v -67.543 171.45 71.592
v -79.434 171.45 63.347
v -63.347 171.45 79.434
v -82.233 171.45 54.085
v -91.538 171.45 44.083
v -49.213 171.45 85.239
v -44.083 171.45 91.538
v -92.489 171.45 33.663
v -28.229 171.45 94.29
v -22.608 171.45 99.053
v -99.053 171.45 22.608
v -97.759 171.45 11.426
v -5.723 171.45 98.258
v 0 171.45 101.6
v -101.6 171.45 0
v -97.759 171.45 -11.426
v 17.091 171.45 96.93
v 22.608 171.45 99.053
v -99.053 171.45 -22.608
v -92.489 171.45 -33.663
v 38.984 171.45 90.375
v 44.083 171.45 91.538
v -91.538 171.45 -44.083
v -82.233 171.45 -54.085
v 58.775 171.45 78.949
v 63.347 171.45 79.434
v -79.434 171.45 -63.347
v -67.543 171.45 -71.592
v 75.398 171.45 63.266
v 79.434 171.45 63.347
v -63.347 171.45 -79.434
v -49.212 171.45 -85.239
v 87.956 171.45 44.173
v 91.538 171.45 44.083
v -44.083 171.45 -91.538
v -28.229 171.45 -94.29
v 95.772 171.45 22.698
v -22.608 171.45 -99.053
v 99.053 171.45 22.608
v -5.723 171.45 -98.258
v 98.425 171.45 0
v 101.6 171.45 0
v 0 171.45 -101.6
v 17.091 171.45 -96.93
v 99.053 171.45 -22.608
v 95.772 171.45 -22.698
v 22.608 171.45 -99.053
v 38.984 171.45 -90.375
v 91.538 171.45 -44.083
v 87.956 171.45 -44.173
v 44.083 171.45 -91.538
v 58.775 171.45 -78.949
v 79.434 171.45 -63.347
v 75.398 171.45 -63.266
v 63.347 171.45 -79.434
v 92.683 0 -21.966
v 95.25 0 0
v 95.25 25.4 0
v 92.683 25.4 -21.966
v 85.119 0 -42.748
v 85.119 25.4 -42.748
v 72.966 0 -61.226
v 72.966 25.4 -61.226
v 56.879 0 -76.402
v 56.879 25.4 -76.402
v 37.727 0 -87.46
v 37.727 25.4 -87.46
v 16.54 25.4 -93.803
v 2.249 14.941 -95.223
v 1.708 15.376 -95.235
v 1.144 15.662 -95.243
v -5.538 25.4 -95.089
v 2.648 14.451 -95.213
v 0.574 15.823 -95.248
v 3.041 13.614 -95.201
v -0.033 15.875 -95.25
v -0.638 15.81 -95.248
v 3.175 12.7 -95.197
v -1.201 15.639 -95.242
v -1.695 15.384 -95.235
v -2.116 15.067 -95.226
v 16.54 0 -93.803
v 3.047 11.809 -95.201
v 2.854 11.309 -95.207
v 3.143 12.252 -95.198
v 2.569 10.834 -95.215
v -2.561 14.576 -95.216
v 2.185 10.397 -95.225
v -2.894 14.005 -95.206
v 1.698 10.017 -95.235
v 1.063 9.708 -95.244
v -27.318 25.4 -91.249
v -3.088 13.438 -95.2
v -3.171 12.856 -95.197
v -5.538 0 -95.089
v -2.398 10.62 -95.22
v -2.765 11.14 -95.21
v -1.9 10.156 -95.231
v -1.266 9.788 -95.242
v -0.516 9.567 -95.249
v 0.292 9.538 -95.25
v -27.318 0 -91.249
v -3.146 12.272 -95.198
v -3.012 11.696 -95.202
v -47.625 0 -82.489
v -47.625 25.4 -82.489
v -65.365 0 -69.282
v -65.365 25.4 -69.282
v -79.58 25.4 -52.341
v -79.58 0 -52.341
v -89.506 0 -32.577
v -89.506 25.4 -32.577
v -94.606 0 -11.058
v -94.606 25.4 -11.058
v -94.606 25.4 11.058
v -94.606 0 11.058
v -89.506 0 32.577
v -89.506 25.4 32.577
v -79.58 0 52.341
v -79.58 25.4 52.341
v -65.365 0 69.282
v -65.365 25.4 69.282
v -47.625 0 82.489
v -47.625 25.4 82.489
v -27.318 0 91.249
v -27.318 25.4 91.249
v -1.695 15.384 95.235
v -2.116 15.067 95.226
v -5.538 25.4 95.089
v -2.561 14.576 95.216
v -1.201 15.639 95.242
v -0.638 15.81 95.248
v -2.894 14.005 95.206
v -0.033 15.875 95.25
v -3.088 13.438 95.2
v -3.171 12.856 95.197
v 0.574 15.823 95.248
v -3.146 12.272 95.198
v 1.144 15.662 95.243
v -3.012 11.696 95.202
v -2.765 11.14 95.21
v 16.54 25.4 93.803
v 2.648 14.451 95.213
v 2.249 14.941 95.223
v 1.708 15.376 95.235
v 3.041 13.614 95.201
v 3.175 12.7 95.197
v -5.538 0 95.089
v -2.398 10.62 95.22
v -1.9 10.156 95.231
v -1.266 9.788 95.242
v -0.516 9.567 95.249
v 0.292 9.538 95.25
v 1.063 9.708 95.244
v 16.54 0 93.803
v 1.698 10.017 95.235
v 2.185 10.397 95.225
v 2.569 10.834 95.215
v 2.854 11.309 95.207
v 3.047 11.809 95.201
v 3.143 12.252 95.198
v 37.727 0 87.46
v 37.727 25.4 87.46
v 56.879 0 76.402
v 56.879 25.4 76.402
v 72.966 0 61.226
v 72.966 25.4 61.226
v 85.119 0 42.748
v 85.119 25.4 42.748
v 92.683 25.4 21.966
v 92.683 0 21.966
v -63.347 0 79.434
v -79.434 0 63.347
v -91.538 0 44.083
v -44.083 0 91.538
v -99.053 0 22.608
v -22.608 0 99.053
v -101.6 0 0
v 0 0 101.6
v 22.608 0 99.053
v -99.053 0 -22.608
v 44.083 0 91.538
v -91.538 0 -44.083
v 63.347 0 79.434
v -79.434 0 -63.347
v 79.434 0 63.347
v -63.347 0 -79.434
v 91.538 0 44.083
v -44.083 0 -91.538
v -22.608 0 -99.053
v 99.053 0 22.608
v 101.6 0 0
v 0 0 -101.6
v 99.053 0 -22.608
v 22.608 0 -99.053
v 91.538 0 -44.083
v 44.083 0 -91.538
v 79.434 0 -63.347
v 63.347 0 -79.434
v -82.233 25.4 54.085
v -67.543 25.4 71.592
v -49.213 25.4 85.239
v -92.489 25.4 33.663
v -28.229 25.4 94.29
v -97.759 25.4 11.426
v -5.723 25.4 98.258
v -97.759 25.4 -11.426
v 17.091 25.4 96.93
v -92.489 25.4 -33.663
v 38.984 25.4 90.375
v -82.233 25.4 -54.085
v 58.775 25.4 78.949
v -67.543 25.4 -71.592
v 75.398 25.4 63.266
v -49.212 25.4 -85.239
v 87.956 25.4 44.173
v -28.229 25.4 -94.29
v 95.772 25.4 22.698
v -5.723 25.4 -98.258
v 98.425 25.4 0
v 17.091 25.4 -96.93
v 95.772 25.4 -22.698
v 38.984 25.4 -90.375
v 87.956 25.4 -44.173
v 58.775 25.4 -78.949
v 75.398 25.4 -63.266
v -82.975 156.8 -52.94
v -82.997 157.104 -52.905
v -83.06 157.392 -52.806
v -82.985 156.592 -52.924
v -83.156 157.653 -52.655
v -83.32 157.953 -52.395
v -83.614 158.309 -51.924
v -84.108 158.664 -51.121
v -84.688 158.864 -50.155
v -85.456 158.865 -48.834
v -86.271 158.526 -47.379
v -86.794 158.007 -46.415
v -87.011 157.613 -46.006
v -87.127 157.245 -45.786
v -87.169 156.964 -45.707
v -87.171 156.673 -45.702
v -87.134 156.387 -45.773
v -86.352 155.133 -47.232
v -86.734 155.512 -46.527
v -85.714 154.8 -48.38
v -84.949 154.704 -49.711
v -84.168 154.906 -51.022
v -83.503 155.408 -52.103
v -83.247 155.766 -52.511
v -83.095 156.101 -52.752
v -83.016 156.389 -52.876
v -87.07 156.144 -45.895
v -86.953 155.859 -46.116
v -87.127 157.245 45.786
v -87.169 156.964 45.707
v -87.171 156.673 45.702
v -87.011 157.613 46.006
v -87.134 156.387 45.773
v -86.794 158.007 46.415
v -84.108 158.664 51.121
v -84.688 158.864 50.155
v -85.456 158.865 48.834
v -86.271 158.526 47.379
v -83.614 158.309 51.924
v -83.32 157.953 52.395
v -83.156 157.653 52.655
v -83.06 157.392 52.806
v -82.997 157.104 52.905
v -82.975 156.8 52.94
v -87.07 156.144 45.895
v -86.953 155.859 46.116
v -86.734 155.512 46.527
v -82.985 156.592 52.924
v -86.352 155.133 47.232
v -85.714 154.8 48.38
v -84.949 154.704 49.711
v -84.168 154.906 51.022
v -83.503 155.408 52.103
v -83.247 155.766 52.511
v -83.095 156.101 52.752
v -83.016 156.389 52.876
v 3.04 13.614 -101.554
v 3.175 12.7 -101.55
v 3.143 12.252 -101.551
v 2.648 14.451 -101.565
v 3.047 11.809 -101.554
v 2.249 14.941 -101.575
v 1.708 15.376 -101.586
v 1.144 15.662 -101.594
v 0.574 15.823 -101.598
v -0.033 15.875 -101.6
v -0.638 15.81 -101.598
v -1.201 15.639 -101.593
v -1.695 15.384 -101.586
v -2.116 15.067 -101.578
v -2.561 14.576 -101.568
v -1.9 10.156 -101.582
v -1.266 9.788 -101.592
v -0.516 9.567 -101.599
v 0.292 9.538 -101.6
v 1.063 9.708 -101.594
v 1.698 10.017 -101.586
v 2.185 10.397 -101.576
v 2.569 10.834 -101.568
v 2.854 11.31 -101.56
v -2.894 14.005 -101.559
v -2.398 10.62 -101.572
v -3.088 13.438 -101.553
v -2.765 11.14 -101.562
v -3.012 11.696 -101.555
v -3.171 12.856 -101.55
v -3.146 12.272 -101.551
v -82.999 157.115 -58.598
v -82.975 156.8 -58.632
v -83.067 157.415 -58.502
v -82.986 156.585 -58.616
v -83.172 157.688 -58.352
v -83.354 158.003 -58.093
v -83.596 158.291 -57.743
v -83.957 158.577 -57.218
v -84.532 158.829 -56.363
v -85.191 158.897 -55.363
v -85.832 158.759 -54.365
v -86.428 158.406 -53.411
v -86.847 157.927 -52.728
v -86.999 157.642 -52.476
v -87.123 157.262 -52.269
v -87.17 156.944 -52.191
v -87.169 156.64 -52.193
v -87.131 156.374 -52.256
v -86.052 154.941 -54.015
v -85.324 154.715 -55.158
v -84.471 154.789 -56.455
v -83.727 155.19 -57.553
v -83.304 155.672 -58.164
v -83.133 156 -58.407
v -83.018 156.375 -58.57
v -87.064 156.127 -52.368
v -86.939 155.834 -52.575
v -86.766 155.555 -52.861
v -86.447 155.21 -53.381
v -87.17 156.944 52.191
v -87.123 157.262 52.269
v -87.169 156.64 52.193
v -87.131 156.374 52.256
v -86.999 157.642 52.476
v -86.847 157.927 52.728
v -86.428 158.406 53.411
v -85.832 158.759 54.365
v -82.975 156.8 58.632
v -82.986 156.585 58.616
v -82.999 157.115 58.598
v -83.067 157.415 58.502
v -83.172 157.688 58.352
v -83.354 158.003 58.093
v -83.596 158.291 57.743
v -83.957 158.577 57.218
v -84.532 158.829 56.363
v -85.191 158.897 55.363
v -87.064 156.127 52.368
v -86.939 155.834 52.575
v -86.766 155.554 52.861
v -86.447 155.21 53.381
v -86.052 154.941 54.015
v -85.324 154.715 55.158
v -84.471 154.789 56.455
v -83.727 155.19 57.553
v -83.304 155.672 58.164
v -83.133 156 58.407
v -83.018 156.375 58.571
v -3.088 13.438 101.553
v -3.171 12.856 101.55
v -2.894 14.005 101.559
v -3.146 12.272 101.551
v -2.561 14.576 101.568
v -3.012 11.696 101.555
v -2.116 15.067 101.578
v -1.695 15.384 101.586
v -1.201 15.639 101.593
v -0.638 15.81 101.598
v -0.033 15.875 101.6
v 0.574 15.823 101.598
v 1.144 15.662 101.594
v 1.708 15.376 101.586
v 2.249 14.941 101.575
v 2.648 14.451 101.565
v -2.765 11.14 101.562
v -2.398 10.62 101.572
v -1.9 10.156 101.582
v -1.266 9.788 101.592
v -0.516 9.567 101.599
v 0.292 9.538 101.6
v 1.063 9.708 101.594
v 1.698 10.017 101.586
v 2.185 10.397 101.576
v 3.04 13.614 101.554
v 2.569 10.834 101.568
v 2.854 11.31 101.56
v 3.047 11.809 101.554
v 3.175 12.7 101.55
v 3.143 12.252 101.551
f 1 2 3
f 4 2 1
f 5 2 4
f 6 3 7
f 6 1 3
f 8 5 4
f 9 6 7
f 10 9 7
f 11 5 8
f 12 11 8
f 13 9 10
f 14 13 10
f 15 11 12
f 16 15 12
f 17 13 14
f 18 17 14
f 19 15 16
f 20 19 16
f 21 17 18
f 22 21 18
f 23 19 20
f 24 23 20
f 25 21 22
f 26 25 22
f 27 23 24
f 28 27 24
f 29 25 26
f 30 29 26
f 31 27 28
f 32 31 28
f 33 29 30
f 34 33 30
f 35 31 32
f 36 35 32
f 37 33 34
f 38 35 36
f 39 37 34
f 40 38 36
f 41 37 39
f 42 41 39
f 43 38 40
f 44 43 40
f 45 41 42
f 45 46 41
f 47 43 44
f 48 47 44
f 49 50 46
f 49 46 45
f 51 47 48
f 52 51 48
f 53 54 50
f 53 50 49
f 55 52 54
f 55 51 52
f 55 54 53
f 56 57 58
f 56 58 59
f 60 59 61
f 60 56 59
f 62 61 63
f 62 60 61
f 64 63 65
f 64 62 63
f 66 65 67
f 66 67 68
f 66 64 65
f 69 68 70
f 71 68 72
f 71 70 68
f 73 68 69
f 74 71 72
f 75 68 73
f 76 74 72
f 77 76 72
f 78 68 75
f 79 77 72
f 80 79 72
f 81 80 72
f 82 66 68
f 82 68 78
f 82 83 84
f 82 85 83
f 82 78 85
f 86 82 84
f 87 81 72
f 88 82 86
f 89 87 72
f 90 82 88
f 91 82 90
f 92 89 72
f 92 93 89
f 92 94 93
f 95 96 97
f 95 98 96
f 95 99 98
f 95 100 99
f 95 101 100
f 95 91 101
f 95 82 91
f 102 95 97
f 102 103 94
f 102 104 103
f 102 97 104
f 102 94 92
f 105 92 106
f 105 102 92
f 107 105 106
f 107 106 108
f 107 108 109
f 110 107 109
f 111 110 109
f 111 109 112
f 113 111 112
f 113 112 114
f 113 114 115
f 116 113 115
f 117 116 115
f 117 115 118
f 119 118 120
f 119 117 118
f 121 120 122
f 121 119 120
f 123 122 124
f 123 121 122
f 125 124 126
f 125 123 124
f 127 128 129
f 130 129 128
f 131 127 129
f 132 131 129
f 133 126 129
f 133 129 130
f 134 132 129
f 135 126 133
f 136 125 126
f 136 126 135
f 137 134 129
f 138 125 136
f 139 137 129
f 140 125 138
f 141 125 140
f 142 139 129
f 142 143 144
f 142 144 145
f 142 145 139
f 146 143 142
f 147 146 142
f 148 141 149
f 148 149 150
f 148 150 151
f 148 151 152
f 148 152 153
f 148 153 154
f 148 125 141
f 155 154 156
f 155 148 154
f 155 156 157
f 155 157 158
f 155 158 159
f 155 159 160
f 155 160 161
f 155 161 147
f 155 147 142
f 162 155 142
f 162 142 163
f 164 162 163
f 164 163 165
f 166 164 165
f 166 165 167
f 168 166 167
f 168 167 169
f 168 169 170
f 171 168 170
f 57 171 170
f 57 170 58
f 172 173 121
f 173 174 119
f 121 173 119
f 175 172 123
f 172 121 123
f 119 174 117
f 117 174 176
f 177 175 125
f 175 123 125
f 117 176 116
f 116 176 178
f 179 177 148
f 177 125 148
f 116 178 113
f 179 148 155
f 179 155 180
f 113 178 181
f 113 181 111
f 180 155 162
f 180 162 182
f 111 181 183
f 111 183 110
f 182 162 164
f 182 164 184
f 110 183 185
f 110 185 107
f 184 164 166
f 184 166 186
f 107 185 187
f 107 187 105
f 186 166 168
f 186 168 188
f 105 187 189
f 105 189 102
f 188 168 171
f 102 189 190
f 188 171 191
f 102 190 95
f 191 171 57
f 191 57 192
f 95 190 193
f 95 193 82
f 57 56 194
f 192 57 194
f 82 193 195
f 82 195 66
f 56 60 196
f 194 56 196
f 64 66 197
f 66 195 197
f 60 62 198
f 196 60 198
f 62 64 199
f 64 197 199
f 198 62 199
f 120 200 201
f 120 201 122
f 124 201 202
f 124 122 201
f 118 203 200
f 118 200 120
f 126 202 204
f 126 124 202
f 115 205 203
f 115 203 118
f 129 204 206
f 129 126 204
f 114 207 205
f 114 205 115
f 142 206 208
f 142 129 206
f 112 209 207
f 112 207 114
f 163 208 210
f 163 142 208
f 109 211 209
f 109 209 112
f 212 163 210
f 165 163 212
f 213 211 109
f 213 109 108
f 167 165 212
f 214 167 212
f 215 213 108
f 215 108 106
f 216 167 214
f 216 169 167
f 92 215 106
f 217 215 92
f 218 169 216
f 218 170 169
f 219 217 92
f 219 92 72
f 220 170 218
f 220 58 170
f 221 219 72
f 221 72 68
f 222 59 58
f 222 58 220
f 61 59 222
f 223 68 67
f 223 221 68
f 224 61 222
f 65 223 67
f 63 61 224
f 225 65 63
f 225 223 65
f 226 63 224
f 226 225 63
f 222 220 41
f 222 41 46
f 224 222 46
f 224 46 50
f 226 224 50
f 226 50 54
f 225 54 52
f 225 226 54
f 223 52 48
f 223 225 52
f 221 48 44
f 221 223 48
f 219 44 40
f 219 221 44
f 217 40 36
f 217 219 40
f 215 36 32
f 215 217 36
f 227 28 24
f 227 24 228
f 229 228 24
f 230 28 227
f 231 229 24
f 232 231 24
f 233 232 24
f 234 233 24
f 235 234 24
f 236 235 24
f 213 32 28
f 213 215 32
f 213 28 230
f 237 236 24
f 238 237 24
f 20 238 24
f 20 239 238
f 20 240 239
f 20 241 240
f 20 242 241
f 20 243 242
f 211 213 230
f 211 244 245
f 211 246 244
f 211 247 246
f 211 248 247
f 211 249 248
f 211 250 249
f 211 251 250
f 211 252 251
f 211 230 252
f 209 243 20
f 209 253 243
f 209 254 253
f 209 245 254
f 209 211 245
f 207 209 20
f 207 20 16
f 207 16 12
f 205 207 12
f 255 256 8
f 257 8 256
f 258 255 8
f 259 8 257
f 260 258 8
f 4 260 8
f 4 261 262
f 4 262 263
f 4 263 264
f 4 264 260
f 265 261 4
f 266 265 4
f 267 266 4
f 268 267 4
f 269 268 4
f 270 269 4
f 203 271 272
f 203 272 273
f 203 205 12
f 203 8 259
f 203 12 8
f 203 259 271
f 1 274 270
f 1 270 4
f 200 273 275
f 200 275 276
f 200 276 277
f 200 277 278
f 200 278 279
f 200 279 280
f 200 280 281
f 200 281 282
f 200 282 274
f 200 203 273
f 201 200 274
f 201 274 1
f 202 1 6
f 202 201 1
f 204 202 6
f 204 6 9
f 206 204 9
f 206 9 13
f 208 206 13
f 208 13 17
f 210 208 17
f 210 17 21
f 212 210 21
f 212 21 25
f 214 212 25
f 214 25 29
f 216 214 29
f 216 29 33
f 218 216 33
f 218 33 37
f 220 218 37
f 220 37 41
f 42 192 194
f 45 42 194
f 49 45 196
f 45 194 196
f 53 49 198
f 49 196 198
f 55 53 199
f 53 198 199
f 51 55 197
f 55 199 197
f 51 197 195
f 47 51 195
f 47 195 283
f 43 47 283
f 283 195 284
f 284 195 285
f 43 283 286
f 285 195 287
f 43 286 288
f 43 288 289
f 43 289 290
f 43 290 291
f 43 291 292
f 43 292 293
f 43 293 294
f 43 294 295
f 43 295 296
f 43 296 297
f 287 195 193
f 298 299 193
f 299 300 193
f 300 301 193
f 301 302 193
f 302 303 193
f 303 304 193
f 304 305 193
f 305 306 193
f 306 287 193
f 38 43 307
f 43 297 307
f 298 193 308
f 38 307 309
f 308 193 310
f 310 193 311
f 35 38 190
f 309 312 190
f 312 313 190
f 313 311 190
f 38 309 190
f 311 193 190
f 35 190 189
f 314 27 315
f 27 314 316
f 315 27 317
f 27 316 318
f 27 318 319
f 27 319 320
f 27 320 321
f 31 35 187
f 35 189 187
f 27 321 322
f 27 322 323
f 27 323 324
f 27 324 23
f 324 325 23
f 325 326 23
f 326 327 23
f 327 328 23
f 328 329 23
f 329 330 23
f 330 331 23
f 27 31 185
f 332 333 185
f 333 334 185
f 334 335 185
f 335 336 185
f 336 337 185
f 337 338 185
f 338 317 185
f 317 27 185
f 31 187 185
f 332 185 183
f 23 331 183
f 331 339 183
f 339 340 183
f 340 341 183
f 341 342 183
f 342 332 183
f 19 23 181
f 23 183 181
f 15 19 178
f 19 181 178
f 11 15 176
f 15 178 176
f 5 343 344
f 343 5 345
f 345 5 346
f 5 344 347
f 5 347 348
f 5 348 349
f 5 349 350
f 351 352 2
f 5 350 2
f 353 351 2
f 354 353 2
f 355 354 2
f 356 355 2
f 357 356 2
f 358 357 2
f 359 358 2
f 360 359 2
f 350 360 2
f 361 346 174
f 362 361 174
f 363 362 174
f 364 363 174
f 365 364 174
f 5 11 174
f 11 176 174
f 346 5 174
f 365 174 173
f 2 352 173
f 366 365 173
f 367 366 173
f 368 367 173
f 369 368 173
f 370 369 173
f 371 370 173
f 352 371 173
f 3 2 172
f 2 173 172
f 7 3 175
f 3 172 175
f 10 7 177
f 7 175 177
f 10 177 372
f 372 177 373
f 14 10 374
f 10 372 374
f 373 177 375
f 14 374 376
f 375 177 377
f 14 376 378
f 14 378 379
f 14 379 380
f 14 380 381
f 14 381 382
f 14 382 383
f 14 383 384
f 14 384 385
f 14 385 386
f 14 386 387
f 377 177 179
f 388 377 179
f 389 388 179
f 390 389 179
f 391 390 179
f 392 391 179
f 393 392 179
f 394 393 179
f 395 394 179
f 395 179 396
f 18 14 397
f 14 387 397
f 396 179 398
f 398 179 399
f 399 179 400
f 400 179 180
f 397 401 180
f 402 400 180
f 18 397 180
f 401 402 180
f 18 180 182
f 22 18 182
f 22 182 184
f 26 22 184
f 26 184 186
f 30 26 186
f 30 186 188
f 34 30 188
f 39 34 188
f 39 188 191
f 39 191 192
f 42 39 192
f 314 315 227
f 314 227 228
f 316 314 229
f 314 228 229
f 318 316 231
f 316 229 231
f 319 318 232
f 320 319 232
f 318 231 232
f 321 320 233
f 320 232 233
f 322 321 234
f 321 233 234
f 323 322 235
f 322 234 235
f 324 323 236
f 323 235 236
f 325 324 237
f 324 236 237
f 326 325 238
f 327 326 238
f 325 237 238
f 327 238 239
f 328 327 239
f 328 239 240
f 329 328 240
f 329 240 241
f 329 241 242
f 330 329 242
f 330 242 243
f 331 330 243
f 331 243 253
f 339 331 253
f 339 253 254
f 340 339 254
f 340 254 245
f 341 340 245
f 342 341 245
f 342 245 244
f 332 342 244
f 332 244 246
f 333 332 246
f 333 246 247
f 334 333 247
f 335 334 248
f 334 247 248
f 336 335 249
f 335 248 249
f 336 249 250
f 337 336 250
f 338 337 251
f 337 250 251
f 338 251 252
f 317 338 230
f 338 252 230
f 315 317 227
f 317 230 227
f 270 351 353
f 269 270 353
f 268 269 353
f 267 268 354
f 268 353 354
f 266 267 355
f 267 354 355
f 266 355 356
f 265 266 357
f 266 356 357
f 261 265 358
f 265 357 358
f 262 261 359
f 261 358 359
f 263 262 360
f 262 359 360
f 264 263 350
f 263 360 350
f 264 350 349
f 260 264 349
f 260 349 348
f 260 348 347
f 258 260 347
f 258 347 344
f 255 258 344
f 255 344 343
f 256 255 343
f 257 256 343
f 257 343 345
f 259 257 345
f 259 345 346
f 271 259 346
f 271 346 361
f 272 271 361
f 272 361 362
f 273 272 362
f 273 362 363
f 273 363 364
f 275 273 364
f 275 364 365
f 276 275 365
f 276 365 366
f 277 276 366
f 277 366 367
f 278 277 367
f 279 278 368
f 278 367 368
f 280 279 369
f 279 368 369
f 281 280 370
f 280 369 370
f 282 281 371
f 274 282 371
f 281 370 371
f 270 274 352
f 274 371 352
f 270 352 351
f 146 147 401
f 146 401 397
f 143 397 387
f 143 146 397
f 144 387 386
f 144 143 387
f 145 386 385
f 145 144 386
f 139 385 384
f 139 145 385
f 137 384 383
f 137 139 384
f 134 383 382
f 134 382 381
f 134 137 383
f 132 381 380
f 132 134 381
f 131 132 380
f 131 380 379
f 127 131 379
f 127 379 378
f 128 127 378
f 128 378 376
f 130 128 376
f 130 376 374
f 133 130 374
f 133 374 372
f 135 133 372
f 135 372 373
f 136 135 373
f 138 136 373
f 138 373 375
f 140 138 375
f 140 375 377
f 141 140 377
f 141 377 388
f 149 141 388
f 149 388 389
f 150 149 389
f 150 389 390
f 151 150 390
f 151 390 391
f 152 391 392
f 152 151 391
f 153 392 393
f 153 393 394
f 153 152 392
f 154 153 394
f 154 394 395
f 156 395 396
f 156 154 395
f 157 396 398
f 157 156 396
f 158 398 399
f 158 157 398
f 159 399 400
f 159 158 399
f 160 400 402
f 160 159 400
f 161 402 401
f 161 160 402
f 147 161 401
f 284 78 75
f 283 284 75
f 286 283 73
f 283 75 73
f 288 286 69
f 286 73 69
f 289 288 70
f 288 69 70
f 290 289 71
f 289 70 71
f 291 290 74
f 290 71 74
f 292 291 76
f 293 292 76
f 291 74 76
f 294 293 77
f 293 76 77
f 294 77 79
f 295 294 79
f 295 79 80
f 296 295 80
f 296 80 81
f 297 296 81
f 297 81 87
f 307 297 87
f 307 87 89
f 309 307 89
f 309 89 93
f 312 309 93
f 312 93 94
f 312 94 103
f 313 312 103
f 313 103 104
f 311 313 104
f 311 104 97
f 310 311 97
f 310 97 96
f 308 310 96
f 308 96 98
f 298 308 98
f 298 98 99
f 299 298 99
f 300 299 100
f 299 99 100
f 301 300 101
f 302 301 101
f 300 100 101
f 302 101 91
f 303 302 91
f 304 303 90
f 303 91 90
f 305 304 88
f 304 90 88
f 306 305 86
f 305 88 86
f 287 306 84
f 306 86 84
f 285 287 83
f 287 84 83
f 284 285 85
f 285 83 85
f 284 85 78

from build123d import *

# Parameters (mm, degrees)
SKETCH1_R               = 101.6
SKETCH1_R_2             = 95.25
BOSS_EXTRUDE1_DEPTH     = 25.4
SKETCH2_R               = 3.175
CUT_EXTRUDE1_DEPTH      = 102.6
CUT_EXTRUDE1_DEPTH_BACK = 102.6
SKETCH5_R               = 101.6
SKETCH5_R_2             = 98.425
BOSS_EXTRUDE2_DEPTH     = 146.05
SKETCH9_R               = 2.1
CUT_EXTRUDE5_DEPTH      = 204.2000001


with BuildPart() as part:
    # Sketch1 → Boss-Extrude1 (new body)
    with BuildSketch(Plane(origin=(0, 0, 0), x_dir=(1, 0, 0), z_dir=(0, 1, 0))):
        Circle(SKETCH1_R)
        Circle(SKETCH1_R_2, mode=Mode.SUBTRACT)
    extrude(amount=BOSS_EXTRUDE1_DEPTH)

    # Sketch2 → Cut-Extrude1 (cut, two sides)
    with BuildSketch(Plane.XY) as cut_extrude1_sk:
        with Locations((0, 12.7)):
            Circle(SKETCH2_R)
    extrude(amount=CUT_EXTRUDE1_DEPTH, mode=Mode.SUBTRACT)
    extrude(cut_extrude1_sk.sketch, amount=-CUT_EXTRUDE1_DEPTH_BACK, mode=Mode.SUBTRACT)

    # Sketch5 → Boss-Extrude2 (add)
    with BuildSketch(Plane(origin=(0, 25.4, 0), x_dir=(1, 0, 0), z_dir=(0, 1, 0))):
        Circle(SKETCH5_R)
        Circle(SKETCH5_R_2, mode=Mode.SUBTRACT)
    extrude(amount=BOSS_EXTRUDE2_DEPTH)

    # Sketch9 → Cut-Extrude5 (cut, through all)
    with BuildSketch(Plane.XY.offset(101.6)):
        with Locations((-85.075, 156.8)):
            Circle(SKETCH9_R)
    extrude(amount=-CUT_EXTRUDE5_DEPTH, mode=Mode.SUBTRACT)


solid = part.part
